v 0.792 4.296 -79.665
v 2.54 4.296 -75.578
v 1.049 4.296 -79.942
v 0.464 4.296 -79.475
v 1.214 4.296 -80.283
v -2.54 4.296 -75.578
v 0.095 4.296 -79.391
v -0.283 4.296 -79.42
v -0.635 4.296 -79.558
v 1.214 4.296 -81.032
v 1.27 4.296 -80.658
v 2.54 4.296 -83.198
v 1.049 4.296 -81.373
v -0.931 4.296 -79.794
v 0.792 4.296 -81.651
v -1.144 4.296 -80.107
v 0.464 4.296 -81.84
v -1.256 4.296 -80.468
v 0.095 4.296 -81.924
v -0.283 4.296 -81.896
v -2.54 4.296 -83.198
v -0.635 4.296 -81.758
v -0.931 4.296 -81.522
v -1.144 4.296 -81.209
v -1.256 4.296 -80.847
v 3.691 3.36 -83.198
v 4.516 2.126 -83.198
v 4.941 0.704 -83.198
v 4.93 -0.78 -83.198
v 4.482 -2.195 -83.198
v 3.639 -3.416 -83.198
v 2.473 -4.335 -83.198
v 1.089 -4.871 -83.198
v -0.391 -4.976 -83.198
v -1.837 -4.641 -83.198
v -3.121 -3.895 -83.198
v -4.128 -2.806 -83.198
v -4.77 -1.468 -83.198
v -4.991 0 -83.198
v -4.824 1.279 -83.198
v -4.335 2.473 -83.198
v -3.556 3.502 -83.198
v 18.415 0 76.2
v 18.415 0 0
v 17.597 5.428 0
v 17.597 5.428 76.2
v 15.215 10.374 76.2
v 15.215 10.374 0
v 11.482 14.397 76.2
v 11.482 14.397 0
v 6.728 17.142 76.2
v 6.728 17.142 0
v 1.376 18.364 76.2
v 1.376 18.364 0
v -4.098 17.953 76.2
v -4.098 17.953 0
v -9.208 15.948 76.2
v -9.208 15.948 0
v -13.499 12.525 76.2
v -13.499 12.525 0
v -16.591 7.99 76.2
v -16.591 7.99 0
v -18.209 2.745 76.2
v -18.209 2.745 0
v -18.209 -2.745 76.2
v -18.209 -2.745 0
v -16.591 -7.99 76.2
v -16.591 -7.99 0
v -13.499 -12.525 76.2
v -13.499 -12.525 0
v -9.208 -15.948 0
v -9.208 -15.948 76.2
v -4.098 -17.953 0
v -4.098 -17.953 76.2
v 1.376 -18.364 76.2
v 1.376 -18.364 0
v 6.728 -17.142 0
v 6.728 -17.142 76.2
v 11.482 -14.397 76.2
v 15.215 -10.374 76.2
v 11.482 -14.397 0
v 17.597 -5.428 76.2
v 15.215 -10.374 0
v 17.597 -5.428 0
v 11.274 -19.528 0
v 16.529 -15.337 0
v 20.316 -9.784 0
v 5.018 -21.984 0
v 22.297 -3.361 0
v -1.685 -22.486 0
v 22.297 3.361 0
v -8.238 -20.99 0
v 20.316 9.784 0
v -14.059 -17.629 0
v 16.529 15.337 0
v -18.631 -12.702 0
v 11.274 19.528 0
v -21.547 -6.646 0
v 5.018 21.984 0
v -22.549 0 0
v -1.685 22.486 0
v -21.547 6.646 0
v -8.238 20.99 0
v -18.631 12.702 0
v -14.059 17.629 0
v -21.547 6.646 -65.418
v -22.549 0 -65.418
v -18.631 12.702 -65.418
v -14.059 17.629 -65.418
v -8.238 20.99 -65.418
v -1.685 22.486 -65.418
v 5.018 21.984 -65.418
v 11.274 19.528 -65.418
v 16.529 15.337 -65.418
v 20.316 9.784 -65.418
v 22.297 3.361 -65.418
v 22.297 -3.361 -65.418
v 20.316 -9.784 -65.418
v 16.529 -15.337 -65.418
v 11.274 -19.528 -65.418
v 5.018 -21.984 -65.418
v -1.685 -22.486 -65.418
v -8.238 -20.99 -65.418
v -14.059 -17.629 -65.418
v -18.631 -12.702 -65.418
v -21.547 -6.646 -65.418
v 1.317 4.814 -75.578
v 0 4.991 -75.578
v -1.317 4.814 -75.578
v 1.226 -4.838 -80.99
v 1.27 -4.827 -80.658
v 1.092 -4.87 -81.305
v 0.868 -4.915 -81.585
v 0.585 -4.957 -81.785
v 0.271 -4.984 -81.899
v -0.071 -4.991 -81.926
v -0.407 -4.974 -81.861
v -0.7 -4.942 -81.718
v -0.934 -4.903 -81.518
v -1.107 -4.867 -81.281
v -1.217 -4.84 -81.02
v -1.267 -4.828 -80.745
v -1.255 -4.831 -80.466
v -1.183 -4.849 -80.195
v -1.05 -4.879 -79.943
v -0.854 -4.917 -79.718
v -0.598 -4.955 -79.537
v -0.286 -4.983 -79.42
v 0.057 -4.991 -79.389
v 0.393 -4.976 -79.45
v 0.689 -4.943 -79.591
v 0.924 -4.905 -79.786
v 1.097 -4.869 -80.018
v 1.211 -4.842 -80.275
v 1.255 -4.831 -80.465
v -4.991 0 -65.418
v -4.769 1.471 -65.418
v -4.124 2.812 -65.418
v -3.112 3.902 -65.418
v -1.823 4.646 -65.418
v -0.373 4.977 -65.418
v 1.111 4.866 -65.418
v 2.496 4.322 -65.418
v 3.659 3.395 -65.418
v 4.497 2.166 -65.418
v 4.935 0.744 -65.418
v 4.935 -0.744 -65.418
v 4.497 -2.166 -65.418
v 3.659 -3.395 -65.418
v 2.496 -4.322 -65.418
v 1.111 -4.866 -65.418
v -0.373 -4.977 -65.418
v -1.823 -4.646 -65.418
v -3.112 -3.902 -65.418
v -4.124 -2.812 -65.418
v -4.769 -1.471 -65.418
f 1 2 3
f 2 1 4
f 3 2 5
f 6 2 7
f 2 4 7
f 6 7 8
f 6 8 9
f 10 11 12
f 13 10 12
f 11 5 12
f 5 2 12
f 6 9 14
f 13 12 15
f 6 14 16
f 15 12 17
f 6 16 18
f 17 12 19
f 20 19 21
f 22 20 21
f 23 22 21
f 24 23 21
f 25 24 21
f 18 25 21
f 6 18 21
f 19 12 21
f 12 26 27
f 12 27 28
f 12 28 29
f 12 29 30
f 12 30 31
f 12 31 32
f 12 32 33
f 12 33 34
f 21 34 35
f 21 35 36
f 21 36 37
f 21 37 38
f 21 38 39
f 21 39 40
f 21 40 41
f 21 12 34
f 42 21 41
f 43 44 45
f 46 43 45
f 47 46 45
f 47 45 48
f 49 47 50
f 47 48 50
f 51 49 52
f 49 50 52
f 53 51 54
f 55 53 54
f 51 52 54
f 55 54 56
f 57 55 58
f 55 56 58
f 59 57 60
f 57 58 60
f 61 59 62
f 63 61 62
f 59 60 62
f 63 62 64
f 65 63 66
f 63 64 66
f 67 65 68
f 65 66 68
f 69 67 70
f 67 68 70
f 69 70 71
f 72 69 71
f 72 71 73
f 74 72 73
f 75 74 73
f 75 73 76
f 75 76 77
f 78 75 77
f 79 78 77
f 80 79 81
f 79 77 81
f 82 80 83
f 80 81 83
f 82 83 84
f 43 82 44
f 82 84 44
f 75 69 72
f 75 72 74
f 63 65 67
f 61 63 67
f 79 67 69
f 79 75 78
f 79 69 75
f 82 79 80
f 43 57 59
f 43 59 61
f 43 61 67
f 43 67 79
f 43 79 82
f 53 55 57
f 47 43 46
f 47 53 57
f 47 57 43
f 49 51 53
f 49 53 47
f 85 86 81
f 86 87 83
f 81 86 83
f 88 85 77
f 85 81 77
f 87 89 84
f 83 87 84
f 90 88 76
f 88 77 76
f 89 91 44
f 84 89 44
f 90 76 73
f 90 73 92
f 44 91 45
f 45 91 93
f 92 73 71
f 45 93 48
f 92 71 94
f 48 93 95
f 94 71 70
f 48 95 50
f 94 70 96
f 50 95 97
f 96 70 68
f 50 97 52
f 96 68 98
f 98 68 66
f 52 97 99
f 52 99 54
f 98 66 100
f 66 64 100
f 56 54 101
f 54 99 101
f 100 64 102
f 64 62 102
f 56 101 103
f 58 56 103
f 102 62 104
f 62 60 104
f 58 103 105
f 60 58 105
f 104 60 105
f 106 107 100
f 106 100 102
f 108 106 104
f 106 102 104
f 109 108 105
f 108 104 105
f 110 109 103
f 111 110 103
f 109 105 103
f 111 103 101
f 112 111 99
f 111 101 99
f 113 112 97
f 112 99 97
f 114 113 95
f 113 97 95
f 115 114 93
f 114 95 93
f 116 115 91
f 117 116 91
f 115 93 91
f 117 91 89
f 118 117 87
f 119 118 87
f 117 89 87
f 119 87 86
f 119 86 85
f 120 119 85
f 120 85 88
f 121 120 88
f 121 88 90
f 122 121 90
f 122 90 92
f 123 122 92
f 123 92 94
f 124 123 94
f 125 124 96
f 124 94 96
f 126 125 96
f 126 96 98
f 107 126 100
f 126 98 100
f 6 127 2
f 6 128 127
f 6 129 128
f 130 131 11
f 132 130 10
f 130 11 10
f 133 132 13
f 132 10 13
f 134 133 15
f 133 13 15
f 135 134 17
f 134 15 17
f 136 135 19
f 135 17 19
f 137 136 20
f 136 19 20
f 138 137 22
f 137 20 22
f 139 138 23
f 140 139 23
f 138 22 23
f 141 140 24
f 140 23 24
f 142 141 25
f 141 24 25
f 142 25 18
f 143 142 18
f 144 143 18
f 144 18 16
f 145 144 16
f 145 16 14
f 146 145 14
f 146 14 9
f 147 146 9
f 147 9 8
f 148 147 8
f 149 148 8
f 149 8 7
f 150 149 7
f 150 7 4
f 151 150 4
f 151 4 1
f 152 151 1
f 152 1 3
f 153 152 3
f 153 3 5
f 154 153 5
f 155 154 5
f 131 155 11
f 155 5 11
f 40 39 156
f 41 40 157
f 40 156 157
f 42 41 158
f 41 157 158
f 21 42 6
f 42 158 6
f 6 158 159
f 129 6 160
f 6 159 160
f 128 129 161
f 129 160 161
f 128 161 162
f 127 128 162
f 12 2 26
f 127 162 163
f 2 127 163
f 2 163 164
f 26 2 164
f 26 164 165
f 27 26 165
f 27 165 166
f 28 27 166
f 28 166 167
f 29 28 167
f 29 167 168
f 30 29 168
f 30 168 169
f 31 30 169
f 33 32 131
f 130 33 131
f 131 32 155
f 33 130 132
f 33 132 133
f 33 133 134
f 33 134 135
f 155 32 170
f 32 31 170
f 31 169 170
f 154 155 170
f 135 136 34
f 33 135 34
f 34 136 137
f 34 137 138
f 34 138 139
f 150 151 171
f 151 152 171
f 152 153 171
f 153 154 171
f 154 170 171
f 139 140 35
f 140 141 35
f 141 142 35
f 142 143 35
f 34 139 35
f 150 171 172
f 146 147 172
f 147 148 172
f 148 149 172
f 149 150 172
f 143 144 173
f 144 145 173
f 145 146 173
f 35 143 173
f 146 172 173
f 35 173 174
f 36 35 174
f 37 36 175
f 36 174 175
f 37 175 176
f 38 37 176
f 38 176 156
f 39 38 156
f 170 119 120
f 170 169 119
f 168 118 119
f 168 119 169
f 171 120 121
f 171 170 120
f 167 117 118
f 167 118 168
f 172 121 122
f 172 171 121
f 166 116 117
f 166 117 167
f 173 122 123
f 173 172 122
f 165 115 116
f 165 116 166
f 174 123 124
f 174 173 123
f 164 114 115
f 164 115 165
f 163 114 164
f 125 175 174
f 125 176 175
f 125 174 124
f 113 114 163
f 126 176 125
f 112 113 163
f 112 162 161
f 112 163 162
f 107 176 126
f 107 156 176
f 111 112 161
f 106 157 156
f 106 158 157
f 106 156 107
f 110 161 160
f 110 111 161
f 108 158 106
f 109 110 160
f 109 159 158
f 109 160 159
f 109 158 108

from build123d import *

# Parameters (mm, degrees)
SKETCH1_R           = 18.415
BOSS_EXTRUDE1_DEPTH = 76.2
SKETCH2_R           = 22.54885
BOSS_EXTRUDE2_DEPTH = 65.4177
SKETCH3_R           = 4.9911
BOSS_EXTRUDE3_DEPTH = 17.78
SKETCH5_W           = 5.08
SKETCH5_H           = 1.253731976
CUT_EXTRUDE1_DEPTH  = 7.62
CUT_EXTRUDE2_REACH  = 28.845
SKETCH6_R           = 1.27


with BuildPart() as part:
    # Sketch1 → Boss-Extrude1 (new body)
    with BuildSketch(Plane.XY):
        Circle(SKETCH1_R)
    extrude(amount=BOSS_EXTRUDE1_DEPTH)

    # Sketch2 → Boss-Extrude2 (add)
    with BuildSketch(Plane(origin=(0, 0, 0), x_dir=(-1, 0, 0), z_dir=(0, 0, -1))):
        Circle(SKETCH2_R)
    extrude(amount=BOSS_EXTRUDE2_DEPTH)

    # Sketch3 → Boss-Extrude3 (add)
    with BuildSketch(Plane(origin=(0, 0, -65.4177), x_dir=(-1, 0, 0), z_dir=(0, 0, -1))):
        Circle(SKETCH3_R)
    extrude(amount=BOSS_EXTRUDE3_DEPTH)

    # Sketch5 → Cut-Extrude1 (cut)
    with BuildSketch(Plane(origin=(0, 0, -83.1977), x_dir=(-1, 0, 0), z_dir=(0, 0, -1))):
        with Locations((0, 4.923315593)):
            Rectangle(SKETCH5_W, SKETCH5_H)
    extrude(amount=-CUT_EXTRUDE1_DEPTH, mode=Mode.SUBTRACT)

    # Sketch6 → Cut-Extrude2 (cut, up to next)
    with BuildSketch(Plane(origin=(0, 4.296449605, 0), x_dir=(1, 0, 0), z_dir=(0, 1, 0)), mode=Mode.PRIVATE) as cut_extrude2_sk1:
        with Locations((0, 80.6577)):
            Circle(SKETCH6_R)
    cut_extrude2_tool1 = extrude(cut_extrude2_sk1.sketch, amount=-CUT_EXTRUDE2_REACH, mode=Mode.PRIVATE) & part.part
    add(cut_extrude2_tool1.solids().sort_by_distance((0, 4.29645, -80.6577))[0], mode=Mode.SUBTRACT)


solid = part.part
